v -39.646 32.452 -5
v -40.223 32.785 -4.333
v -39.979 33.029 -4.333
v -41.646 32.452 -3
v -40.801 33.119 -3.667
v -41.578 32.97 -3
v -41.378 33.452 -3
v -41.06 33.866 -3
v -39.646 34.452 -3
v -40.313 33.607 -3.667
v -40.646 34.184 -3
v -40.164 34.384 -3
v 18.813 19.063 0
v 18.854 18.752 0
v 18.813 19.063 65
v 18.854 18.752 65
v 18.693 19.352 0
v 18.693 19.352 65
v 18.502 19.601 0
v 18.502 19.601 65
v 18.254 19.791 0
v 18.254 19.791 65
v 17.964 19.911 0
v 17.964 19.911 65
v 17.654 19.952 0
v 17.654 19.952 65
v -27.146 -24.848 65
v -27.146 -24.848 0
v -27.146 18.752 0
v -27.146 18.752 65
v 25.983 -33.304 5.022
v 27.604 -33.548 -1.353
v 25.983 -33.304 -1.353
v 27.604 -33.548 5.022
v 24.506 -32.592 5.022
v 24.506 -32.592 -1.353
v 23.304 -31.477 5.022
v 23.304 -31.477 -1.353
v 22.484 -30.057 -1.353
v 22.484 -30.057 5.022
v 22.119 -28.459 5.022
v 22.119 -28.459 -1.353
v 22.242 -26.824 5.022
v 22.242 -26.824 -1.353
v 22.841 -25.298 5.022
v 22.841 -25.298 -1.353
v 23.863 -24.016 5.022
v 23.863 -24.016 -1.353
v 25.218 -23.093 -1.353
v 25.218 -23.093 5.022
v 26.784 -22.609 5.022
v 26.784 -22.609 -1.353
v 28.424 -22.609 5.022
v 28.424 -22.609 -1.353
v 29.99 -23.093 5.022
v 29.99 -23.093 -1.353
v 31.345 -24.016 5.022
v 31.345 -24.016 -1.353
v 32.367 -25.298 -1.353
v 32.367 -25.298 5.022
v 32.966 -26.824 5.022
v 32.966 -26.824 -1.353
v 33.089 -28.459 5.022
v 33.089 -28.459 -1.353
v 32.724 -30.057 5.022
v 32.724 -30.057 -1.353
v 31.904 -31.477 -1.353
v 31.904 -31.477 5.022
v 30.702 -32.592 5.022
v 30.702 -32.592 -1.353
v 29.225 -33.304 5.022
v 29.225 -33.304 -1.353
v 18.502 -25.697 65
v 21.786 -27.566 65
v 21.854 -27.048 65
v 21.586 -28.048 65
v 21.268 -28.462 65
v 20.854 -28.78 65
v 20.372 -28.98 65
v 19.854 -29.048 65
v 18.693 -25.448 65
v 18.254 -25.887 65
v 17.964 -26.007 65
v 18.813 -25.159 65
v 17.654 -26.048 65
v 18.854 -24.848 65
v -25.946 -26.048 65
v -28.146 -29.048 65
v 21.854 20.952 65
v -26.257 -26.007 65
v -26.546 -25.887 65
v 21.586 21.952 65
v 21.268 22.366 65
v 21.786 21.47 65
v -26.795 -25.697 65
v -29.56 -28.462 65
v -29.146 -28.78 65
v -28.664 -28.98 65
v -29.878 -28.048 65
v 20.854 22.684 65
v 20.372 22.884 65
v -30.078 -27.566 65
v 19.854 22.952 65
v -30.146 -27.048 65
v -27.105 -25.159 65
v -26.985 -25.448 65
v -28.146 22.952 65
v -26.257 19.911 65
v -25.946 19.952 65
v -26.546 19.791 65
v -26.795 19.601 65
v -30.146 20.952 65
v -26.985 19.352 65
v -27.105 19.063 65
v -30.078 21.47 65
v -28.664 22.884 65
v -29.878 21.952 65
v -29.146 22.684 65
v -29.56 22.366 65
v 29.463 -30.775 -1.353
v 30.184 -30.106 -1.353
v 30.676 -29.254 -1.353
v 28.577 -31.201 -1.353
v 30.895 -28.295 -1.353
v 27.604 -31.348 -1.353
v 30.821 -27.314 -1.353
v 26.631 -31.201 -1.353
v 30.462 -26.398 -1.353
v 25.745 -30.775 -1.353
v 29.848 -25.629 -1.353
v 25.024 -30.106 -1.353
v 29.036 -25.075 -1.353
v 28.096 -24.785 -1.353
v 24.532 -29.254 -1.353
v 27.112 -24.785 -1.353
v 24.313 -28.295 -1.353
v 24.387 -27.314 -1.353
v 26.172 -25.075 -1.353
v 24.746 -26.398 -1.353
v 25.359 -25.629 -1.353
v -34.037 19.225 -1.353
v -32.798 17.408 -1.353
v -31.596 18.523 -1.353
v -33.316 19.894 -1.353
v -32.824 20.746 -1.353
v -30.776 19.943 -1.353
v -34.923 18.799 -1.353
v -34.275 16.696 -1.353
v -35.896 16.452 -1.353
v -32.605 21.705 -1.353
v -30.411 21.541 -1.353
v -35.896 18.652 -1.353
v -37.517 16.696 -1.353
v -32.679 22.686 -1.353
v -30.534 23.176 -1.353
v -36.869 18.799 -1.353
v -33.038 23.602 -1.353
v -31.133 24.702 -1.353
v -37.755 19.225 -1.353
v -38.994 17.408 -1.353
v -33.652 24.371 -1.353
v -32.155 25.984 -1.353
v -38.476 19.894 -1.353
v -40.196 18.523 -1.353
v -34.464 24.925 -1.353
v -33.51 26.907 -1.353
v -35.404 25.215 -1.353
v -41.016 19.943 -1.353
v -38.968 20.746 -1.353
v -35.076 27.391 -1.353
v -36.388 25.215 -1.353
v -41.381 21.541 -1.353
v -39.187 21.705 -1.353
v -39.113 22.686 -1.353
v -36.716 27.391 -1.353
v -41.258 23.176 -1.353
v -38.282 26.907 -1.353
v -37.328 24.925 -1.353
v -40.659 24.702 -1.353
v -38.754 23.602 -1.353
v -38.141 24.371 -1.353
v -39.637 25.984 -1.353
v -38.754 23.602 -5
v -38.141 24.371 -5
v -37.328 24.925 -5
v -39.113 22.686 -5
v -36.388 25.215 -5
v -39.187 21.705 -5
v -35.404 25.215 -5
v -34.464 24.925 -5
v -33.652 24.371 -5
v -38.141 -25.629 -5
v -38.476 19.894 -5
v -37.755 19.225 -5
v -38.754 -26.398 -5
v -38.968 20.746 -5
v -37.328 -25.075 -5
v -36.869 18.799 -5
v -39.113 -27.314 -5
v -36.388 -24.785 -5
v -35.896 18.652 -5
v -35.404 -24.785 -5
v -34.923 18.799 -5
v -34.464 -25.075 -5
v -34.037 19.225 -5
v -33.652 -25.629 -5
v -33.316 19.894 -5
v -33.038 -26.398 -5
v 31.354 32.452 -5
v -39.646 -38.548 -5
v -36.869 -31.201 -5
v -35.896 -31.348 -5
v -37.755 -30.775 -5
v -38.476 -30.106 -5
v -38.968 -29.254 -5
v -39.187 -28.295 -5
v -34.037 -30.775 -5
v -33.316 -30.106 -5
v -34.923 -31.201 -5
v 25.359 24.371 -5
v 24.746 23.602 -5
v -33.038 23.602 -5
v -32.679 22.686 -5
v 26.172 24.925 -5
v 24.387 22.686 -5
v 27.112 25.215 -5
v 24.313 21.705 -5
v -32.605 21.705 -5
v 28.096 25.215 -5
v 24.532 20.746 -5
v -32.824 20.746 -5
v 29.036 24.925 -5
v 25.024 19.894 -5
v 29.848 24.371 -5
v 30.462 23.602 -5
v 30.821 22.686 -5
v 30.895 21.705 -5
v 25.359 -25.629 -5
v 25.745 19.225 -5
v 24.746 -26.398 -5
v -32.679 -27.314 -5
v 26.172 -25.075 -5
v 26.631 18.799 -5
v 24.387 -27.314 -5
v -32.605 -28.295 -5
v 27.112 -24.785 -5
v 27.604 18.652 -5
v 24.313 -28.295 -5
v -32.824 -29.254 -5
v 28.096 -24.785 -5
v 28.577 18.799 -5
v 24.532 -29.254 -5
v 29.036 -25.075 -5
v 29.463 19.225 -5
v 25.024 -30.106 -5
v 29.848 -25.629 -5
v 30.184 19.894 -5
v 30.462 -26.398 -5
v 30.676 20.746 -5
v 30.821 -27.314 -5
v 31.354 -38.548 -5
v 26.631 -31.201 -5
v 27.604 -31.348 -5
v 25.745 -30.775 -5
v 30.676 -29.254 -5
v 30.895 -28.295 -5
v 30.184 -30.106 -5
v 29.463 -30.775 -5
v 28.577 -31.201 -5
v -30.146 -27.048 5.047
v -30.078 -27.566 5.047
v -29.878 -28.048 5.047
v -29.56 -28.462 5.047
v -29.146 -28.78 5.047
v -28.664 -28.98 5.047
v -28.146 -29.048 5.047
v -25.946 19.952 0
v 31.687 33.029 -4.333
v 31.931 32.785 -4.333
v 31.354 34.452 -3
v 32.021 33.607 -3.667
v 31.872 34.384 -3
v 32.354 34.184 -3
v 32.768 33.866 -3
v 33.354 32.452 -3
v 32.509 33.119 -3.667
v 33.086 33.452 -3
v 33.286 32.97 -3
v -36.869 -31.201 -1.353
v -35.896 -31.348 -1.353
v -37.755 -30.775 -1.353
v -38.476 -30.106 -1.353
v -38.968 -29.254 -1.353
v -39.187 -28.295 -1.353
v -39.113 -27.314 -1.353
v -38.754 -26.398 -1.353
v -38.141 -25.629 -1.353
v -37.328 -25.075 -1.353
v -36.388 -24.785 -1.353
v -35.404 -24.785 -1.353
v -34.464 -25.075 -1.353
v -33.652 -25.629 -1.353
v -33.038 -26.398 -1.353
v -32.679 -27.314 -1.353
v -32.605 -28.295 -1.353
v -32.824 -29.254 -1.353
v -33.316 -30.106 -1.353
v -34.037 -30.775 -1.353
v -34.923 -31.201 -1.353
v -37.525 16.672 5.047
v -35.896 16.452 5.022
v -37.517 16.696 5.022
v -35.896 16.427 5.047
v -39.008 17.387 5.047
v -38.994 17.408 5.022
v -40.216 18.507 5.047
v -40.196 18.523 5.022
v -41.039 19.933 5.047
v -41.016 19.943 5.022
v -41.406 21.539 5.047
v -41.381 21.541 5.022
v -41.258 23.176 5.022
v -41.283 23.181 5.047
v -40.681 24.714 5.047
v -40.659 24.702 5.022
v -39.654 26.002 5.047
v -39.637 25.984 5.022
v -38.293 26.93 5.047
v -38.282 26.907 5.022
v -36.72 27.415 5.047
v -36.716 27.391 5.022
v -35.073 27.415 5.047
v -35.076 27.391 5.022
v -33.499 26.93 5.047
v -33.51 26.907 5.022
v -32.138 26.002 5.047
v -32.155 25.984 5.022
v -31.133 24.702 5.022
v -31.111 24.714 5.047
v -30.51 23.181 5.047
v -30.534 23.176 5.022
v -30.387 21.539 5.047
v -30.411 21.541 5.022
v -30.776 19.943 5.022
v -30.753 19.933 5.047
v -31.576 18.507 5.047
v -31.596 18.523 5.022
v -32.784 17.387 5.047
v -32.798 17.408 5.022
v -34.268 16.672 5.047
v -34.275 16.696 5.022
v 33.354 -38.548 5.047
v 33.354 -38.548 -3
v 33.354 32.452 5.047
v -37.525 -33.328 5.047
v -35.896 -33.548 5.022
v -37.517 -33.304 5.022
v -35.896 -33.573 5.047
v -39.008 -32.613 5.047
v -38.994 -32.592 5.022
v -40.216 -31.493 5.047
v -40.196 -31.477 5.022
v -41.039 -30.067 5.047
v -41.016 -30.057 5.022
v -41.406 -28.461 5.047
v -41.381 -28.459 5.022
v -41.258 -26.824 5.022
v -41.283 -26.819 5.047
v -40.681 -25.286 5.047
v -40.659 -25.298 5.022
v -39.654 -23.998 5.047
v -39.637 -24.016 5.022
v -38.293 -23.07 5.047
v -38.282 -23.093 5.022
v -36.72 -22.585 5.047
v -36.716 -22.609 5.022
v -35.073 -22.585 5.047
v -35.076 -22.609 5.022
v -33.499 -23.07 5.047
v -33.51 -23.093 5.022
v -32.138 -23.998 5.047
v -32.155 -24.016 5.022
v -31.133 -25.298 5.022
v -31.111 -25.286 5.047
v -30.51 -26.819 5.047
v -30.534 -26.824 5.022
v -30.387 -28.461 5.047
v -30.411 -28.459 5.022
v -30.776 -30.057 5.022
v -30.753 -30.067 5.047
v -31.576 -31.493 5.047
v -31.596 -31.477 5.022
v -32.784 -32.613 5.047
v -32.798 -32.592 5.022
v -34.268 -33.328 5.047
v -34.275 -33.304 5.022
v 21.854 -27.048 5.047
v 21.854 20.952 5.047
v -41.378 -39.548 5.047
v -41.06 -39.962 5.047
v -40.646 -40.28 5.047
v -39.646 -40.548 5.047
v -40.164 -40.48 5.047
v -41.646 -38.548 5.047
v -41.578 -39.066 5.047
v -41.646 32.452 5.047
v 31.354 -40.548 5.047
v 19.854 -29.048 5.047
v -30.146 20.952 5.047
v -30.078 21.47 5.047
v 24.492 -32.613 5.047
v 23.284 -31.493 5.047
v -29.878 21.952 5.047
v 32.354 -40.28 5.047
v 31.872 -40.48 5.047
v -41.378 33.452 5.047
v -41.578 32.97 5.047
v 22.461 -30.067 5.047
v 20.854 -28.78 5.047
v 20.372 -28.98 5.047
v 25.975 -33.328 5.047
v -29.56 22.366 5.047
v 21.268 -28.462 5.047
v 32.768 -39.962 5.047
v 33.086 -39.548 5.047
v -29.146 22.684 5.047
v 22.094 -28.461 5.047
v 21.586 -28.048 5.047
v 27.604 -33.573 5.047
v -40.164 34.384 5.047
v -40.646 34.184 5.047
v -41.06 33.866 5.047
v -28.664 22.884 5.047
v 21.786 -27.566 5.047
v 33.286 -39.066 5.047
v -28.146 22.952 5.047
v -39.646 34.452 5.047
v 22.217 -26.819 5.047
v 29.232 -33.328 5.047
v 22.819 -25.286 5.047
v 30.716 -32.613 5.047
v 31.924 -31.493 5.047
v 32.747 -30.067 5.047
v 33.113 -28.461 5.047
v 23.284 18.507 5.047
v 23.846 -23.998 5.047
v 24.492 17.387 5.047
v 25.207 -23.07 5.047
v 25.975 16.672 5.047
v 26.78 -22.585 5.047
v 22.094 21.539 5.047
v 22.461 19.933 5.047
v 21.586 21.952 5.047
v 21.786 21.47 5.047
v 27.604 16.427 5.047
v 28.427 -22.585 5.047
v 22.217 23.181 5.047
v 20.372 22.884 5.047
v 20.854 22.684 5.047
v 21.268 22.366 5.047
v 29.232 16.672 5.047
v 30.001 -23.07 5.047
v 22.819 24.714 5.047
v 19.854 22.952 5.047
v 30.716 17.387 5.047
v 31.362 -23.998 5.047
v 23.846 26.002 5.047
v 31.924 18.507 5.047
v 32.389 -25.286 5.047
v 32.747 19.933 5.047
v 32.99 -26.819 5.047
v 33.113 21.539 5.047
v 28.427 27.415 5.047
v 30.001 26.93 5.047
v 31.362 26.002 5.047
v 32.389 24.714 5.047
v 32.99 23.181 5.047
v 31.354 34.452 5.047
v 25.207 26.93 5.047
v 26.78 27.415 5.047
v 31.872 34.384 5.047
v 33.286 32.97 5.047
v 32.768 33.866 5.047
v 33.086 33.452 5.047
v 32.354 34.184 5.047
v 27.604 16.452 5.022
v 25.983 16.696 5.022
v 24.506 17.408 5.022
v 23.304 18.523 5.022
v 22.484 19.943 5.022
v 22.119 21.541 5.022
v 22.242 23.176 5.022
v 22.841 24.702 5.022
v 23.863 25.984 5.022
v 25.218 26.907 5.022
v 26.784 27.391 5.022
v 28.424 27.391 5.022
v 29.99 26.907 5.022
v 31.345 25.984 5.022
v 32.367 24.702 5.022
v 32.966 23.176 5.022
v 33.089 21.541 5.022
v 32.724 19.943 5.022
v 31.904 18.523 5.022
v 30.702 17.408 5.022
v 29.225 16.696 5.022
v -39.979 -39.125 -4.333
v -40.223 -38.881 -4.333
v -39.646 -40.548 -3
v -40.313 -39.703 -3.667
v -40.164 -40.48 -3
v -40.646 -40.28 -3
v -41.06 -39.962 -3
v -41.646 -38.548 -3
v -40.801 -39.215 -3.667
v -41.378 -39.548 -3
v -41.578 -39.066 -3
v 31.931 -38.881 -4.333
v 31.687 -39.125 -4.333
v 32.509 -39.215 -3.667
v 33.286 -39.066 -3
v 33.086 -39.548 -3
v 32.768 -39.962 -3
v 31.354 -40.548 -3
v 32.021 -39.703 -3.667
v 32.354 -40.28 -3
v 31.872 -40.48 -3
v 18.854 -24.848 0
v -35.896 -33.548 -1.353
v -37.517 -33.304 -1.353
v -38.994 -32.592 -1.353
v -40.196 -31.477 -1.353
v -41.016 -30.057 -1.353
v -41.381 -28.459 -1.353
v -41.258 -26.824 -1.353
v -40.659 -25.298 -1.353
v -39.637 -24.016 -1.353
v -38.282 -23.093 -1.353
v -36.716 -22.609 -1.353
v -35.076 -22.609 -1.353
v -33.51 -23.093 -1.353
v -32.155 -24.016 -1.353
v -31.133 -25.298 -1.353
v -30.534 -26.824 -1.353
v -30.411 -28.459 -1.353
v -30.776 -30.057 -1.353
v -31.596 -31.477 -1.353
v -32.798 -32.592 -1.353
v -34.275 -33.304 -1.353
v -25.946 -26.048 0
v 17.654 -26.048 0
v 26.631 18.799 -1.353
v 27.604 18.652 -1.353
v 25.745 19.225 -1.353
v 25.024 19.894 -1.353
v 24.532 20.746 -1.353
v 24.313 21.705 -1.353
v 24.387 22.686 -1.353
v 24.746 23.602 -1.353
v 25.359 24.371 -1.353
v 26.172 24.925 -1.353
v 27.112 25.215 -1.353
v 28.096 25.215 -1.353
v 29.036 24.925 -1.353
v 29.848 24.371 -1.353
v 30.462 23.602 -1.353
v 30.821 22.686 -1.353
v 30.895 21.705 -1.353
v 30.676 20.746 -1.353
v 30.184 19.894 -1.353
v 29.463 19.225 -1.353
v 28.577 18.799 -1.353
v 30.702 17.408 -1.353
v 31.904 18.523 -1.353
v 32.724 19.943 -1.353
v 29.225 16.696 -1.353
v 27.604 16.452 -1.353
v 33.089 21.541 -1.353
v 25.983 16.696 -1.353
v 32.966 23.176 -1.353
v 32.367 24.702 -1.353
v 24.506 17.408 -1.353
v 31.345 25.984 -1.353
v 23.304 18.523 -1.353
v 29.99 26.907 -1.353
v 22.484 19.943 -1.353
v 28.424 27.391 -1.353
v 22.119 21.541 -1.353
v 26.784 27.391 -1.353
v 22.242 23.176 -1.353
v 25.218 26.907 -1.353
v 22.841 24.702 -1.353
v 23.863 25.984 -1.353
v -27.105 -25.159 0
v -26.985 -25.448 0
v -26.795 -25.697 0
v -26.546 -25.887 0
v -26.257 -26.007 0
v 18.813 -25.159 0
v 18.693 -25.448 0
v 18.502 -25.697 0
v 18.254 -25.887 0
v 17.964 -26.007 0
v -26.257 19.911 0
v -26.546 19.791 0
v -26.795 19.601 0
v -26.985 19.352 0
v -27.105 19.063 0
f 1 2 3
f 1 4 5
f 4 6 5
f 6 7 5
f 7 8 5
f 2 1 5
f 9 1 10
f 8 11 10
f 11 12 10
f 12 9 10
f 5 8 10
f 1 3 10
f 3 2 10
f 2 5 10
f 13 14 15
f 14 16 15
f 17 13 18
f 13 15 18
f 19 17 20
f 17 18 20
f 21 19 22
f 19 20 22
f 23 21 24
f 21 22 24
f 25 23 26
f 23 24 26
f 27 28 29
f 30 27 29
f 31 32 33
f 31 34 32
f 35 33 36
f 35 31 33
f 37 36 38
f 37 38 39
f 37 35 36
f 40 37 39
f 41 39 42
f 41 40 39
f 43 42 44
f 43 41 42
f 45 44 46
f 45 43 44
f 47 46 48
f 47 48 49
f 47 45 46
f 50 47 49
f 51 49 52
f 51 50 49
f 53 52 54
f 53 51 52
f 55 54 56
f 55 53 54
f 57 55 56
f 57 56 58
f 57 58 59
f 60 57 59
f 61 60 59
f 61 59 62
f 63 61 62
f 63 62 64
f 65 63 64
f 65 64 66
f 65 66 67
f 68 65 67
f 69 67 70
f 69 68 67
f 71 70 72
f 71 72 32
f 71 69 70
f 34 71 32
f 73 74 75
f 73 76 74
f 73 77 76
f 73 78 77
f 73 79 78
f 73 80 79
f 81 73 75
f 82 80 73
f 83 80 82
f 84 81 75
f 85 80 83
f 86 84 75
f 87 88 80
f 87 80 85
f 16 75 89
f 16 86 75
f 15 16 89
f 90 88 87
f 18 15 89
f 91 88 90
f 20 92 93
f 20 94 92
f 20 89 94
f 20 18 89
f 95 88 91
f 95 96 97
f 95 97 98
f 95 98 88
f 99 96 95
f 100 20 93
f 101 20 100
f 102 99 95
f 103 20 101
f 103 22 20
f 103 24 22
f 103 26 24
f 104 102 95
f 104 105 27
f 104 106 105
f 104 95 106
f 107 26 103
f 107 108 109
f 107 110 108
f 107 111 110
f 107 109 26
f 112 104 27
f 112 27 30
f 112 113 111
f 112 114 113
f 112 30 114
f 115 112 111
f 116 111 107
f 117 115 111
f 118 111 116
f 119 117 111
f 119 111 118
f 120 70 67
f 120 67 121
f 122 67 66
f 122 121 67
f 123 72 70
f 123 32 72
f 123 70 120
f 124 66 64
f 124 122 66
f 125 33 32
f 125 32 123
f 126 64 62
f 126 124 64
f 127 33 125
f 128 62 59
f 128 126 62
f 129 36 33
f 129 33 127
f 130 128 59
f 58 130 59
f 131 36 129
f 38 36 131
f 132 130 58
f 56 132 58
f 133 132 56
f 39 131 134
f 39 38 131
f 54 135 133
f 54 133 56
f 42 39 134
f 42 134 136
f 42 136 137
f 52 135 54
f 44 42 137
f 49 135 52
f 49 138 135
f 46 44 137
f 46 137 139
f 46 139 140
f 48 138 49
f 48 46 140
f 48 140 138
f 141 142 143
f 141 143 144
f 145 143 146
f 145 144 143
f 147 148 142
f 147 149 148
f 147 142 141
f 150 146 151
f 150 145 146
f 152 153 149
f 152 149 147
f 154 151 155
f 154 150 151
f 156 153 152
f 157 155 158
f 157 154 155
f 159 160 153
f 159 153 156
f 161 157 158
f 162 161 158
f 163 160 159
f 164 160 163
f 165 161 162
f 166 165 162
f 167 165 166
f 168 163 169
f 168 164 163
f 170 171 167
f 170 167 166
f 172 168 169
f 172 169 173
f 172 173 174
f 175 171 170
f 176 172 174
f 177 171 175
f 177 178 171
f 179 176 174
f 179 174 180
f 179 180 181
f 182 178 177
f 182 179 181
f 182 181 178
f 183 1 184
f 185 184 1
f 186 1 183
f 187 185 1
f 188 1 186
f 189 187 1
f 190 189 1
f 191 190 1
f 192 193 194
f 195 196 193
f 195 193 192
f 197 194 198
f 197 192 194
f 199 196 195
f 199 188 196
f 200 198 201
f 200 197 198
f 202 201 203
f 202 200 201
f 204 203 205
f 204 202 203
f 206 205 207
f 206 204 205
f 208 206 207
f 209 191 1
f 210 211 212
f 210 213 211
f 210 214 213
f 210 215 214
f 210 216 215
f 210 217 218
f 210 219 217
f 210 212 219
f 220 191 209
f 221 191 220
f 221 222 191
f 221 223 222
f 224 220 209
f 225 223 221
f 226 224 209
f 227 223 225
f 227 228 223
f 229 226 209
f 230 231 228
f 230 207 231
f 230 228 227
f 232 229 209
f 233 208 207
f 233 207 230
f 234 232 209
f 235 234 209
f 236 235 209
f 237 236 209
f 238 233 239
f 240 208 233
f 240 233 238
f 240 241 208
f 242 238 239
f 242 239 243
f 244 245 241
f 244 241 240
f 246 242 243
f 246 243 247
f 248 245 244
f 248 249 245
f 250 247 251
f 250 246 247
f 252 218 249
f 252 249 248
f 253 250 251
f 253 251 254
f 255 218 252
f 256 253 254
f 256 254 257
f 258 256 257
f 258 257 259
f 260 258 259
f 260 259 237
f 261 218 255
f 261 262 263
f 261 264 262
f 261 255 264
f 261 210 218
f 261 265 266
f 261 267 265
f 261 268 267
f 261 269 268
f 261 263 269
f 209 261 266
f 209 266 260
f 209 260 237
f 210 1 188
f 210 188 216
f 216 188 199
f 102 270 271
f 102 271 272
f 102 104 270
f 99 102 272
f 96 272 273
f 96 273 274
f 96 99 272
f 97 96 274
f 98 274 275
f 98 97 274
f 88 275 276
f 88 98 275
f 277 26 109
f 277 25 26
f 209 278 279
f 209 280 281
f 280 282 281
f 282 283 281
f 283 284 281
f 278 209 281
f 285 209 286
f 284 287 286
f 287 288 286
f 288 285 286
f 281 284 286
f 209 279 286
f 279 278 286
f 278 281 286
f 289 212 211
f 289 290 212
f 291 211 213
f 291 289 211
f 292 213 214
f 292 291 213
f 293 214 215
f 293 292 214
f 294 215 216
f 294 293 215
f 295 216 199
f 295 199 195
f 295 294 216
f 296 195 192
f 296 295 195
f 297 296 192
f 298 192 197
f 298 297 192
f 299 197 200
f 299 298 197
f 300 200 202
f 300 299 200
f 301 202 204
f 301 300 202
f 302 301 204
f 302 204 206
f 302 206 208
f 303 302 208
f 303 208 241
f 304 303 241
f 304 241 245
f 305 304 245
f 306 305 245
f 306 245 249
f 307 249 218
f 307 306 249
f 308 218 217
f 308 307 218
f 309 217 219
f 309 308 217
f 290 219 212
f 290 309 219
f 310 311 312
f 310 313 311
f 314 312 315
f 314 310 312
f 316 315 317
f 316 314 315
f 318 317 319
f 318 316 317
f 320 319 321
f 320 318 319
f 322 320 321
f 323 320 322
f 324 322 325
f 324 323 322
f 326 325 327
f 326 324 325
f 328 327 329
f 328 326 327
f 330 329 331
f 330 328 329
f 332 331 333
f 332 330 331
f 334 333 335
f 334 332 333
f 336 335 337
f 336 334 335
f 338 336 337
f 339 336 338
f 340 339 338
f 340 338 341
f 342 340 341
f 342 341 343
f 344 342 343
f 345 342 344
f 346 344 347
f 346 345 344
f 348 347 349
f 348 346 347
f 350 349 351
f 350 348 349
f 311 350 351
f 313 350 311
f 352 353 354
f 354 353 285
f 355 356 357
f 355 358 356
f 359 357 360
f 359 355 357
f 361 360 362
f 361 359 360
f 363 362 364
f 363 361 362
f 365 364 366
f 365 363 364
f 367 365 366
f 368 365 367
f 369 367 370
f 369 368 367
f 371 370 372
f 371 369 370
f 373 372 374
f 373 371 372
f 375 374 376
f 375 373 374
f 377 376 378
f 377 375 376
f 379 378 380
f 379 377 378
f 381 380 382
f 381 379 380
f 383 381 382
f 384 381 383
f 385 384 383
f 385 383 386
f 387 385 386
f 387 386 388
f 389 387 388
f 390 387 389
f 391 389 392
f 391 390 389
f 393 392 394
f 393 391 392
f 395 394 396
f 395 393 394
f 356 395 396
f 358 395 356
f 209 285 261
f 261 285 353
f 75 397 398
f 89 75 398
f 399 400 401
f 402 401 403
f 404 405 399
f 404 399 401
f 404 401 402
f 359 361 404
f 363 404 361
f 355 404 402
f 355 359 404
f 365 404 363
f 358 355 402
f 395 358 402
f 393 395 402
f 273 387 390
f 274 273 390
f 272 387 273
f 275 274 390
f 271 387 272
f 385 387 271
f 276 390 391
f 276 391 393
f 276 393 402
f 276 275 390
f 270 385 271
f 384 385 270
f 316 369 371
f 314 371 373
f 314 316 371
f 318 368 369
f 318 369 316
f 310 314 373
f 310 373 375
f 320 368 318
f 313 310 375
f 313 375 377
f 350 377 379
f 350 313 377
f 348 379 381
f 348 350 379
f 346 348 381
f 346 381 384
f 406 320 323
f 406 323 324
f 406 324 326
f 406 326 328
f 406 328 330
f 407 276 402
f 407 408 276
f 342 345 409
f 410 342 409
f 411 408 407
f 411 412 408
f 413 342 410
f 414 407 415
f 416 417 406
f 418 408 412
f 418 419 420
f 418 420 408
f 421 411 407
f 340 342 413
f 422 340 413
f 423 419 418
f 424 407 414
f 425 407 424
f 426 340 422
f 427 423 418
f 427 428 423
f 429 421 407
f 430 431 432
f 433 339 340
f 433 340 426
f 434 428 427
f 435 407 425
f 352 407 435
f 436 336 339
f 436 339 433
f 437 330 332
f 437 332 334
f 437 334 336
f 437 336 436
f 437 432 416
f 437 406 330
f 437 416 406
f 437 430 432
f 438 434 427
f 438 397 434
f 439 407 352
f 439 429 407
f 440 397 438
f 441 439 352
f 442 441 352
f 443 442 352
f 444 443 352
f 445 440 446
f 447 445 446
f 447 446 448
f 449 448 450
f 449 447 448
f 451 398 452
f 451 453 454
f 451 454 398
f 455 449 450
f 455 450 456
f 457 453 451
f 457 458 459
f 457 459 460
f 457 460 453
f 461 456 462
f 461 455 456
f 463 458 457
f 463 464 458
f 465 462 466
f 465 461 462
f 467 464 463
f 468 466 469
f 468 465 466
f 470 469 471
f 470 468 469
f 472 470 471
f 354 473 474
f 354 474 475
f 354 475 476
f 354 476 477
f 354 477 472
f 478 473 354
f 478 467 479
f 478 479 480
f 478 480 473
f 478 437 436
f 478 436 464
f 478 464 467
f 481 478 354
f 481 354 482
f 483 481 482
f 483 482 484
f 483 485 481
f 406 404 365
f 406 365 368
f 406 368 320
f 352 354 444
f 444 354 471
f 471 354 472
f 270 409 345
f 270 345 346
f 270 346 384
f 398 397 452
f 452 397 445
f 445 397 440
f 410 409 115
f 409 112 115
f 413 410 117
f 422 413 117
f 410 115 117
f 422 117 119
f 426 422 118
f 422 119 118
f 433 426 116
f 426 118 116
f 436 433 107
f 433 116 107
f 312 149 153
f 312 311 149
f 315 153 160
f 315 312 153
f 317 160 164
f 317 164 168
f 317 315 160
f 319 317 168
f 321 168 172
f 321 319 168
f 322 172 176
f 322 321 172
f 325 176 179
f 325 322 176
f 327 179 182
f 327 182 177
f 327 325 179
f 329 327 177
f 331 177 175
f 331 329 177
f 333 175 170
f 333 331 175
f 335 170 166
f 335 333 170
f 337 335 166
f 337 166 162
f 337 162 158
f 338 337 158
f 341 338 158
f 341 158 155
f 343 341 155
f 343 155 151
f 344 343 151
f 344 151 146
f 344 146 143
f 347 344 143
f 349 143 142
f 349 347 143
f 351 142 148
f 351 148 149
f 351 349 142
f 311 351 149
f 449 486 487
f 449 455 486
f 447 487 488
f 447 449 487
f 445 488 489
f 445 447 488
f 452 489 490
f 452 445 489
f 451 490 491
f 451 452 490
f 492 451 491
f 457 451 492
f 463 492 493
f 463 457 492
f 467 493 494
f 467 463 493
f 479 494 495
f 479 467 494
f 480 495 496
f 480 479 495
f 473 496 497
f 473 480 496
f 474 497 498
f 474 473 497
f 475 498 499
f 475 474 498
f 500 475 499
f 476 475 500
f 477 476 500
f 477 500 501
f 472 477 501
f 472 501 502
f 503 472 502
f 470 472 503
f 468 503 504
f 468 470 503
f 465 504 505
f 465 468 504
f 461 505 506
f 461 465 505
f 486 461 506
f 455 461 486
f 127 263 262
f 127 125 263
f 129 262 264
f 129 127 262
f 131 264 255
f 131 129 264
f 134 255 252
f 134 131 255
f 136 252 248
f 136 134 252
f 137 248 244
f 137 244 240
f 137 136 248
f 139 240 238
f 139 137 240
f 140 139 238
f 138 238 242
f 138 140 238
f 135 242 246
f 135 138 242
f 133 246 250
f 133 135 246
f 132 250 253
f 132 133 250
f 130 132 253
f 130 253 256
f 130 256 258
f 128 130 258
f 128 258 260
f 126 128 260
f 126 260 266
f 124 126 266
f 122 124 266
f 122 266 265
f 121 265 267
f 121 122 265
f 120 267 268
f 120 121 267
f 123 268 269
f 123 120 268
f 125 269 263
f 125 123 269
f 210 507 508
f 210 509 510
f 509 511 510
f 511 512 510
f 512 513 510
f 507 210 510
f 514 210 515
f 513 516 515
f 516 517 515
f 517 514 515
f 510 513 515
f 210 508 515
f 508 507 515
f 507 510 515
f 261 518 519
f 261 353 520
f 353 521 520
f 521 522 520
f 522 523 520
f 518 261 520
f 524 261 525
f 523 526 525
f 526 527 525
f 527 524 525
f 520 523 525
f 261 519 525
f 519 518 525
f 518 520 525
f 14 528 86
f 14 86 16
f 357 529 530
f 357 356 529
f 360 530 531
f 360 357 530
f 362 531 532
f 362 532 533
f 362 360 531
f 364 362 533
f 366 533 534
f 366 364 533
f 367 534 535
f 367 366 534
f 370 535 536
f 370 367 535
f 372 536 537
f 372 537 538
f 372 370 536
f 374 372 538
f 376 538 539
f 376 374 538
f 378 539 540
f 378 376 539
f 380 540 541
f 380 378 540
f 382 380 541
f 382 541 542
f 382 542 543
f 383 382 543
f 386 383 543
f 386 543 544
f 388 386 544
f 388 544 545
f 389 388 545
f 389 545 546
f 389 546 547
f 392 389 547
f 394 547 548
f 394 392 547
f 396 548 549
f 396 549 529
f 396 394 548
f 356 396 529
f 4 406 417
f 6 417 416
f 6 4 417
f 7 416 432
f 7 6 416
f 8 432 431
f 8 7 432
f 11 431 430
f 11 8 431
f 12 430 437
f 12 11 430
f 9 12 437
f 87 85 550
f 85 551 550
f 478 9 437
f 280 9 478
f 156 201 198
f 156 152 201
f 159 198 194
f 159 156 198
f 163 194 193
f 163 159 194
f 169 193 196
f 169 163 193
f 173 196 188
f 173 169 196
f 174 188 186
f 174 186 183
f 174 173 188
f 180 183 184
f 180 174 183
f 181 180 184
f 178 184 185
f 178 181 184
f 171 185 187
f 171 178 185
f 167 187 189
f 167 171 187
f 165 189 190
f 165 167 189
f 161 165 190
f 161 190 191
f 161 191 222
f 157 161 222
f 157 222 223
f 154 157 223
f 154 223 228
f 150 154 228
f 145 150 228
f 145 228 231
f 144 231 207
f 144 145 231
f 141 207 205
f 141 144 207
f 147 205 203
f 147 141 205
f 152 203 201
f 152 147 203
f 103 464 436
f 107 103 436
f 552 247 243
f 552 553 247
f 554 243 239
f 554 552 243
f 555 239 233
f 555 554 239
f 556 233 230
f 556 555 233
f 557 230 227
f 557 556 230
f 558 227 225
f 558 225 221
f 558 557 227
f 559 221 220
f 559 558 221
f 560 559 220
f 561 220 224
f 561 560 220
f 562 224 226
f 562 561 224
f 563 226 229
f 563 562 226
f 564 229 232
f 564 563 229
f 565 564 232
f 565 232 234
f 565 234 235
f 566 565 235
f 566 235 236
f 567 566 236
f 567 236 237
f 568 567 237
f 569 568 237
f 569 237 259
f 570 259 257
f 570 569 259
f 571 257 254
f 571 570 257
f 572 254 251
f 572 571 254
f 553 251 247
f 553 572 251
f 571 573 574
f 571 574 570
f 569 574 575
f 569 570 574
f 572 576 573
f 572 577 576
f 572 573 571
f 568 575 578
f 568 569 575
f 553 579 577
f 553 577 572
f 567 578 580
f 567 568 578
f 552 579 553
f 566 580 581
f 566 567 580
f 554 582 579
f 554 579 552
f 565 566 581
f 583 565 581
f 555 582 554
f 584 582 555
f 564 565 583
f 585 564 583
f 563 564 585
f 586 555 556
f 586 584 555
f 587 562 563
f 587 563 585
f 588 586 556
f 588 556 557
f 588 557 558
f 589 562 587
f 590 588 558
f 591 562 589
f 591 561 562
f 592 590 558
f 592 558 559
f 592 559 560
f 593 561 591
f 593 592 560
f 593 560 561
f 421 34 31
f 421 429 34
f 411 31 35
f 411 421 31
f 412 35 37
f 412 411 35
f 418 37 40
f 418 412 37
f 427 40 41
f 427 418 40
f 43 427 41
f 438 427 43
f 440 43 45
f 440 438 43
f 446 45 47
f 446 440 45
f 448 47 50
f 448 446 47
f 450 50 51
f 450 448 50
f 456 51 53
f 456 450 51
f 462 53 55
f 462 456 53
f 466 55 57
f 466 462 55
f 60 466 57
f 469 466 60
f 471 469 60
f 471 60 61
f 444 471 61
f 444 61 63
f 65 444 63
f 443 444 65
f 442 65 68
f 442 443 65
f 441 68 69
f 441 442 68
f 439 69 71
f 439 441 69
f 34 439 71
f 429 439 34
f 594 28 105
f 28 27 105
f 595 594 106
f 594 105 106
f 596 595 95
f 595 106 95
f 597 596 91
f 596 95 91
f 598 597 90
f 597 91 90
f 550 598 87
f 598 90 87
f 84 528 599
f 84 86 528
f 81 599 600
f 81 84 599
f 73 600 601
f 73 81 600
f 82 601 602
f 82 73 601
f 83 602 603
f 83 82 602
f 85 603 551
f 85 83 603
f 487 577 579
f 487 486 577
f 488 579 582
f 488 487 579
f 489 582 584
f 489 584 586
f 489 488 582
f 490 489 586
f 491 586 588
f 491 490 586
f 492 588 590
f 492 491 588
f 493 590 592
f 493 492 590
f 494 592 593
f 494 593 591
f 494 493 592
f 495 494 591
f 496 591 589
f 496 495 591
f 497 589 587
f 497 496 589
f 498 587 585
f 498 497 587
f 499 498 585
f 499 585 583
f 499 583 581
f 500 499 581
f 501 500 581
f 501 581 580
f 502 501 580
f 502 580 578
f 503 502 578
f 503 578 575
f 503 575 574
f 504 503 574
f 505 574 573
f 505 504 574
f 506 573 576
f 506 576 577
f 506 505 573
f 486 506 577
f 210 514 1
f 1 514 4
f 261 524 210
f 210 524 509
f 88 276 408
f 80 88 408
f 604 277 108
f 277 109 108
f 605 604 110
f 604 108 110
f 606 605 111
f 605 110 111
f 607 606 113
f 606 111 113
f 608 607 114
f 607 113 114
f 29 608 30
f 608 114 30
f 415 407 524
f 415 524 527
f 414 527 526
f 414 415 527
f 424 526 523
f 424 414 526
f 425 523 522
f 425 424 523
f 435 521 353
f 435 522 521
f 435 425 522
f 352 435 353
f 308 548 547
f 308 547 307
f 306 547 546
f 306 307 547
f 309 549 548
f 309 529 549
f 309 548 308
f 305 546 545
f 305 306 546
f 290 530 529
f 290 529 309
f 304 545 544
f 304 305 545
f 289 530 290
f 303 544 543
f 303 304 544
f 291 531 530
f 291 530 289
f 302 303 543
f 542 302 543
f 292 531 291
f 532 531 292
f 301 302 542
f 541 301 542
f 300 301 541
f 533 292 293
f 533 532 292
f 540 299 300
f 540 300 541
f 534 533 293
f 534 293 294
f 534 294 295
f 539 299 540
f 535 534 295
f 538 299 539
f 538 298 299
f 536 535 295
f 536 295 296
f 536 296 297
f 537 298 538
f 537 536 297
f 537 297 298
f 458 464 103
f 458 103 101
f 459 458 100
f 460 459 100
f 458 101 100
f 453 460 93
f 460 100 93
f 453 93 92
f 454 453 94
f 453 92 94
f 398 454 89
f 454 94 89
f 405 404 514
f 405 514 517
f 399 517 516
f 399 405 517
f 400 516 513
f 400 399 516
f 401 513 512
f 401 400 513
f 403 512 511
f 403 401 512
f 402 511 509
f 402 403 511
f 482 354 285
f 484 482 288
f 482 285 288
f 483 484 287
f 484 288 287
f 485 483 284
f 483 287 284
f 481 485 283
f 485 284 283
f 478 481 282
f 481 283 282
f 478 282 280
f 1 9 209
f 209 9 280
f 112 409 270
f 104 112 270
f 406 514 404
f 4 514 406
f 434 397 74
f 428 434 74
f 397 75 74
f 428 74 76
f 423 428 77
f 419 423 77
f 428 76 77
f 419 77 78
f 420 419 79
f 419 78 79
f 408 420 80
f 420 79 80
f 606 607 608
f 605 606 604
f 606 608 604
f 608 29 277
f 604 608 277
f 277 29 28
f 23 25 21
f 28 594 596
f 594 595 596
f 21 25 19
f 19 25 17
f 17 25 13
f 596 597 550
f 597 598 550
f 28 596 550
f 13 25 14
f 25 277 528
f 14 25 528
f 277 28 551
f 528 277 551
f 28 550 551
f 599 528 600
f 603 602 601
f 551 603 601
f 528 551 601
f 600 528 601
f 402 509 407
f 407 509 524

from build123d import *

# Parameters (mm, degrees)
SKETCH1_W                                    = 46
SKETCH1_H                                    = 46
BOSS_EXTRUDE1_DEPTH                          = 65
SKETCH3_W                                    = 75
SKETCH3_H                                    = 75
SKETCH3_W_2                                  = 52
SKETCH3_H_2                                  = 52
SKETCH3_W_3                                  = 23
SKETCH3_H_3                                  = 46
BOSS_EXTRUDE2_DEPTH                          = 5
SKETCH8_W                                    = 75
SKETCH8_H                                    = 75
SKETCH8_W_2                                  = 52
SKETCH8_H_2                                  = 52
BOSS_EXTRUDE3_DEPTH                          = 5.047079132
FILLET1_R                                    = 2
CBORE_FOR_M6_HEX_SOCKET_HEAD_CAP_SCR_2_COUNT = 2
CBORE_FOR_M6_HEX_SOCKET_HEAD_CAP_SCR_2_PITCH = 50
CBORE_FOR_M6_HEX_SOCKET_HEAD_CAP_SCR_3_COUNT = 2
CBORE_FOR_M6_HEX_SOCKET_HEAD_CAP_SCR_3_PITCH = 63.5
CBORE_FOR_M6_HEX_SOCKET_HEAD_CAP_SCR_4_COUNT = 2
CBORE_FOR_M6_HEX_SOCKET_HEAD_CAP_SCR_4_PITCH = 80.822336022
CHAMFER2_SIZE                                = 2
FILLET2_R                                    = 1.2


with BuildPart() as part:
    # Sketch1 → Boss-Extrude1 (new body)
    with BuildSketch(Plane(origin=(0, 0, 0), x_dir=(0, 1, 0), z_dir=(0, 0, 1))):
        Polygon((-26.156583063, 30.146094376), (-29.048003873, 30.146094376), (-29.048003873, -21.853905624), (22.951996127, -21.853905624), (22.951996127, 30.146094376), (15.339697873, 30.146094376), align=None)
        with Locations((-3.048003873, 4.146094376)):
            Rectangle(SKETCH1_W, SKETCH1_H, mode=Mode.SUBTRACT)
    extrude(amount=BOSS_EXTRUDE1_DEPTH)

    # Sketch3 → Boss-Extrude2 (add)
    # profile 1 of 5: a face of its own
    with BuildSketch(Plane(origin=(0, 0, 0), x_dir=(1, 0, 0), z_dir=(0, 0, -1))):
        with Locations((-4.146094376, 3.048003873)):
            Rectangle(SKETCH3_W, SKETCH3_H)
        with Locations((-4.146094376, 3.048003873)):
            Rectangle(SKETCH3_W_2, SKETCH3_H_2, mode=Mode.SUBTRACT)
    # profile 2 of 5: a face of its own
    with BuildSketch(Plane(origin=(0, 0, 0), x_dir=(1, 0, 0), z_dir=(0, 0, -1))):
        Polygon((21.853905624, 29.048003873), (-4.146094376, 29.048003873), (-4.146094376, 26.048003873), (18.853905624, 26.048003873), (18.853905624, -19.951996127), (-4.146094376, -19.951996127), (-4.146094376, -22.951996127), (21.853905624, -22.951996127), align=None)
    # profile 3 of 5: a face of its own
    with BuildSketch(Plane(origin=(0, 0, 0), x_dir=(1, 0, 0), z_dir=(0, 0, -1))):
        Polygon((-4.146094376, 26.048003873), (-4.146094376, 29.048003873), (-30.146094376, 29.048003873), (-30.146094376, -22.951996127), (-4.146094376, -22.951996127), (-4.146094376, -19.951996127), (-27.146094376, -19.951996127), (-27.146094376, 26.048003873), align=None)
    # profile 4 of 5: a face of its own
    with BuildSketch(Plane(origin=(0, 0, 0), x_dir=(1, 0, 0), z_dir=(0, 0, -1))):
        with Locations((7.353905624, 3.048003873)):
            Rectangle(SKETCH3_W_3, SKETCH3_H_3)
    # profile 5 of 5: a face of its own
    with BuildSketch(Plane(origin=(0, 0, 0), x_dir=(1, 0, 0), z_dir=(0, 0, -1))):
        with Locations((-15.646094376, 3.048003873)):
            Rectangle(SKETCH3_W_3, SKETCH3_H_3)
    extrude(amount=BOSS_EXTRUDE2_DEPTH)

    # Sketch8 → Boss-Extrude3 (add)
    with BuildSketch(Plane.XY):
        with Locations((-4.146094376, -3.048003873)):
            Rectangle(SKETCH8_W, SKETCH8_H)
        with Locations((-4.146094376, -3.048003873)):
            Rectangle(SKETCH8_W_2, SKETCH8_H_2, mode=Mode.SUBTRACT)
    extrude(amount=BOSS_EXTRUDE3_DEPTH)

    # Fillet1
    fillet1_edges = [part.edges().sort_by_distance(p)[0] for p in [
        (21.853905624, 22.951996127, 35.023539566),
        (21.853905624, -29.048003873, 35.023539566),
        (-30.146094376, -29.048003873, 35.023539566),
        (-30.146094376, 22.951996127, 35.023539566),
        (-41.646094376, -40.548003873, 0.023539566),
        (33.353905624, -40.548003873, 0.023539566),
        (33.353905624, 34.451996127, 0.023539566),
        (-41.646094376, 34.451996127, 0.023539566),
    ]]
    fillet(fillet1_edges, radius=FILLET1_R)

    # Sketch15 → CBORE for M6 Hex Socket Head Cap Screw2 (revolve, cut)
    with BuildSketch(Plane(origin=(-35.896094376, 21.951996127, 5.047079132), x_dir=(0, -1, 0), z_dir=(1, 0, 0))):
        Polygon((0, 0), (0, 10.047079132), (3.3, 10.047079132), (3.3, 6.4), (5.5, 6.4), (5.5, 0.025), (5.525, 0), align=None)
    cbore_for_m6_hex_socket_head_cap_screw2 = revolve(axis=Axis((-35.896094376, 21.951996127, 11.397079132), (0, 0, -1)), mode=Mode.SUBTRACT)

    # CBORE for M6 Hex Socket Head Cap Scr 2: CBORE for M6 Hex Socket Head Cap Screw2 ×2
    with Locations(*[(0, -i * CBORE_FOR_M6_HEX_SOCKET_HEAD_CAP_SCR_2_PITCH, 0) for i in range(1, CBORE_FOR_M6_HEX_SOCKET_HEAD_CAP_SCR_2_COUNT)]):
        add(cbore_for_m6_hex_socket_head_cap_screw2, mode=Mode.SUBTRACT)

    # CBORE for M6 Hex Socket Head Cap Scr 3: CBORE for M6 Hex Socket Head Cap Screw2 ×2
    with Locations(*[(i * CBORE_FOR_M6_HEX_SOCKET_HEAD_CAP_SCR_3_PITCH, 0, 0) for i in range(1, CBORE_FOR_M6_HEX_SOCKET_HEAD_CAP_SCR_3_COUNT)]):
        add(cbore_for_m6_hex_socket_head_cap_screw2, mode=Mode.SUBTRACT)

    # CBORE for M6 Hex Socket Head Cap Scr 4: CBORE for M6 Hex Socket Head Cap Screw2 ×2
    with Locations(*[Vector(0.7856739006278309, -0.6186408666360874, 0) * (i * CBORE_FOR_M6_HEX_SOCKET_HEAD_CAP_SCR_4_PITCH) for i in range(1, CBORE_FOR_M6_HEX_SOCKET_HEAD_CAP_SCR_4_COUNT)]):
        add(cbore_for_m6_hex_socket_head_cap_screw2, mode=Mode.SUBTRACT)

    # Chamfer2
    chamfer2_edges = [part.edges().sort_by_distance(p)[0] for p in [
        (33.353905624, -3.048003873, -5),
        (-4.146094376, 34.451996127, -5),
        (-4.146094376, -40.548003873, -5),
        (-41.646094376, -3.048003873, -5),
        (32.768119187, -39.962217436, -5),
        (-41.060307938, -39.962217436, -5),
        (-41.060307938, 33.866209689, -5),
        (32.768119187, 33.866209689, -5),
    ]]
    chamfer(chamfer2_edges, length=CHAMFER2_SIZE)

    # Fillet2
    fillet2_edges = [part.edges().sort_by_distance(p)[0] for p in [
        (18.853905624, -26.048003873, 32.5),
        (18.853905624, 19.951996127, 32.5),
        (-27.146094376, 19.951996127, 32.5),
        (-27.146094376, -26.048003873, 32.5),
    ]]
    fillet(fillet2_edges, radius=FILLET2_R)


solid = part.part
